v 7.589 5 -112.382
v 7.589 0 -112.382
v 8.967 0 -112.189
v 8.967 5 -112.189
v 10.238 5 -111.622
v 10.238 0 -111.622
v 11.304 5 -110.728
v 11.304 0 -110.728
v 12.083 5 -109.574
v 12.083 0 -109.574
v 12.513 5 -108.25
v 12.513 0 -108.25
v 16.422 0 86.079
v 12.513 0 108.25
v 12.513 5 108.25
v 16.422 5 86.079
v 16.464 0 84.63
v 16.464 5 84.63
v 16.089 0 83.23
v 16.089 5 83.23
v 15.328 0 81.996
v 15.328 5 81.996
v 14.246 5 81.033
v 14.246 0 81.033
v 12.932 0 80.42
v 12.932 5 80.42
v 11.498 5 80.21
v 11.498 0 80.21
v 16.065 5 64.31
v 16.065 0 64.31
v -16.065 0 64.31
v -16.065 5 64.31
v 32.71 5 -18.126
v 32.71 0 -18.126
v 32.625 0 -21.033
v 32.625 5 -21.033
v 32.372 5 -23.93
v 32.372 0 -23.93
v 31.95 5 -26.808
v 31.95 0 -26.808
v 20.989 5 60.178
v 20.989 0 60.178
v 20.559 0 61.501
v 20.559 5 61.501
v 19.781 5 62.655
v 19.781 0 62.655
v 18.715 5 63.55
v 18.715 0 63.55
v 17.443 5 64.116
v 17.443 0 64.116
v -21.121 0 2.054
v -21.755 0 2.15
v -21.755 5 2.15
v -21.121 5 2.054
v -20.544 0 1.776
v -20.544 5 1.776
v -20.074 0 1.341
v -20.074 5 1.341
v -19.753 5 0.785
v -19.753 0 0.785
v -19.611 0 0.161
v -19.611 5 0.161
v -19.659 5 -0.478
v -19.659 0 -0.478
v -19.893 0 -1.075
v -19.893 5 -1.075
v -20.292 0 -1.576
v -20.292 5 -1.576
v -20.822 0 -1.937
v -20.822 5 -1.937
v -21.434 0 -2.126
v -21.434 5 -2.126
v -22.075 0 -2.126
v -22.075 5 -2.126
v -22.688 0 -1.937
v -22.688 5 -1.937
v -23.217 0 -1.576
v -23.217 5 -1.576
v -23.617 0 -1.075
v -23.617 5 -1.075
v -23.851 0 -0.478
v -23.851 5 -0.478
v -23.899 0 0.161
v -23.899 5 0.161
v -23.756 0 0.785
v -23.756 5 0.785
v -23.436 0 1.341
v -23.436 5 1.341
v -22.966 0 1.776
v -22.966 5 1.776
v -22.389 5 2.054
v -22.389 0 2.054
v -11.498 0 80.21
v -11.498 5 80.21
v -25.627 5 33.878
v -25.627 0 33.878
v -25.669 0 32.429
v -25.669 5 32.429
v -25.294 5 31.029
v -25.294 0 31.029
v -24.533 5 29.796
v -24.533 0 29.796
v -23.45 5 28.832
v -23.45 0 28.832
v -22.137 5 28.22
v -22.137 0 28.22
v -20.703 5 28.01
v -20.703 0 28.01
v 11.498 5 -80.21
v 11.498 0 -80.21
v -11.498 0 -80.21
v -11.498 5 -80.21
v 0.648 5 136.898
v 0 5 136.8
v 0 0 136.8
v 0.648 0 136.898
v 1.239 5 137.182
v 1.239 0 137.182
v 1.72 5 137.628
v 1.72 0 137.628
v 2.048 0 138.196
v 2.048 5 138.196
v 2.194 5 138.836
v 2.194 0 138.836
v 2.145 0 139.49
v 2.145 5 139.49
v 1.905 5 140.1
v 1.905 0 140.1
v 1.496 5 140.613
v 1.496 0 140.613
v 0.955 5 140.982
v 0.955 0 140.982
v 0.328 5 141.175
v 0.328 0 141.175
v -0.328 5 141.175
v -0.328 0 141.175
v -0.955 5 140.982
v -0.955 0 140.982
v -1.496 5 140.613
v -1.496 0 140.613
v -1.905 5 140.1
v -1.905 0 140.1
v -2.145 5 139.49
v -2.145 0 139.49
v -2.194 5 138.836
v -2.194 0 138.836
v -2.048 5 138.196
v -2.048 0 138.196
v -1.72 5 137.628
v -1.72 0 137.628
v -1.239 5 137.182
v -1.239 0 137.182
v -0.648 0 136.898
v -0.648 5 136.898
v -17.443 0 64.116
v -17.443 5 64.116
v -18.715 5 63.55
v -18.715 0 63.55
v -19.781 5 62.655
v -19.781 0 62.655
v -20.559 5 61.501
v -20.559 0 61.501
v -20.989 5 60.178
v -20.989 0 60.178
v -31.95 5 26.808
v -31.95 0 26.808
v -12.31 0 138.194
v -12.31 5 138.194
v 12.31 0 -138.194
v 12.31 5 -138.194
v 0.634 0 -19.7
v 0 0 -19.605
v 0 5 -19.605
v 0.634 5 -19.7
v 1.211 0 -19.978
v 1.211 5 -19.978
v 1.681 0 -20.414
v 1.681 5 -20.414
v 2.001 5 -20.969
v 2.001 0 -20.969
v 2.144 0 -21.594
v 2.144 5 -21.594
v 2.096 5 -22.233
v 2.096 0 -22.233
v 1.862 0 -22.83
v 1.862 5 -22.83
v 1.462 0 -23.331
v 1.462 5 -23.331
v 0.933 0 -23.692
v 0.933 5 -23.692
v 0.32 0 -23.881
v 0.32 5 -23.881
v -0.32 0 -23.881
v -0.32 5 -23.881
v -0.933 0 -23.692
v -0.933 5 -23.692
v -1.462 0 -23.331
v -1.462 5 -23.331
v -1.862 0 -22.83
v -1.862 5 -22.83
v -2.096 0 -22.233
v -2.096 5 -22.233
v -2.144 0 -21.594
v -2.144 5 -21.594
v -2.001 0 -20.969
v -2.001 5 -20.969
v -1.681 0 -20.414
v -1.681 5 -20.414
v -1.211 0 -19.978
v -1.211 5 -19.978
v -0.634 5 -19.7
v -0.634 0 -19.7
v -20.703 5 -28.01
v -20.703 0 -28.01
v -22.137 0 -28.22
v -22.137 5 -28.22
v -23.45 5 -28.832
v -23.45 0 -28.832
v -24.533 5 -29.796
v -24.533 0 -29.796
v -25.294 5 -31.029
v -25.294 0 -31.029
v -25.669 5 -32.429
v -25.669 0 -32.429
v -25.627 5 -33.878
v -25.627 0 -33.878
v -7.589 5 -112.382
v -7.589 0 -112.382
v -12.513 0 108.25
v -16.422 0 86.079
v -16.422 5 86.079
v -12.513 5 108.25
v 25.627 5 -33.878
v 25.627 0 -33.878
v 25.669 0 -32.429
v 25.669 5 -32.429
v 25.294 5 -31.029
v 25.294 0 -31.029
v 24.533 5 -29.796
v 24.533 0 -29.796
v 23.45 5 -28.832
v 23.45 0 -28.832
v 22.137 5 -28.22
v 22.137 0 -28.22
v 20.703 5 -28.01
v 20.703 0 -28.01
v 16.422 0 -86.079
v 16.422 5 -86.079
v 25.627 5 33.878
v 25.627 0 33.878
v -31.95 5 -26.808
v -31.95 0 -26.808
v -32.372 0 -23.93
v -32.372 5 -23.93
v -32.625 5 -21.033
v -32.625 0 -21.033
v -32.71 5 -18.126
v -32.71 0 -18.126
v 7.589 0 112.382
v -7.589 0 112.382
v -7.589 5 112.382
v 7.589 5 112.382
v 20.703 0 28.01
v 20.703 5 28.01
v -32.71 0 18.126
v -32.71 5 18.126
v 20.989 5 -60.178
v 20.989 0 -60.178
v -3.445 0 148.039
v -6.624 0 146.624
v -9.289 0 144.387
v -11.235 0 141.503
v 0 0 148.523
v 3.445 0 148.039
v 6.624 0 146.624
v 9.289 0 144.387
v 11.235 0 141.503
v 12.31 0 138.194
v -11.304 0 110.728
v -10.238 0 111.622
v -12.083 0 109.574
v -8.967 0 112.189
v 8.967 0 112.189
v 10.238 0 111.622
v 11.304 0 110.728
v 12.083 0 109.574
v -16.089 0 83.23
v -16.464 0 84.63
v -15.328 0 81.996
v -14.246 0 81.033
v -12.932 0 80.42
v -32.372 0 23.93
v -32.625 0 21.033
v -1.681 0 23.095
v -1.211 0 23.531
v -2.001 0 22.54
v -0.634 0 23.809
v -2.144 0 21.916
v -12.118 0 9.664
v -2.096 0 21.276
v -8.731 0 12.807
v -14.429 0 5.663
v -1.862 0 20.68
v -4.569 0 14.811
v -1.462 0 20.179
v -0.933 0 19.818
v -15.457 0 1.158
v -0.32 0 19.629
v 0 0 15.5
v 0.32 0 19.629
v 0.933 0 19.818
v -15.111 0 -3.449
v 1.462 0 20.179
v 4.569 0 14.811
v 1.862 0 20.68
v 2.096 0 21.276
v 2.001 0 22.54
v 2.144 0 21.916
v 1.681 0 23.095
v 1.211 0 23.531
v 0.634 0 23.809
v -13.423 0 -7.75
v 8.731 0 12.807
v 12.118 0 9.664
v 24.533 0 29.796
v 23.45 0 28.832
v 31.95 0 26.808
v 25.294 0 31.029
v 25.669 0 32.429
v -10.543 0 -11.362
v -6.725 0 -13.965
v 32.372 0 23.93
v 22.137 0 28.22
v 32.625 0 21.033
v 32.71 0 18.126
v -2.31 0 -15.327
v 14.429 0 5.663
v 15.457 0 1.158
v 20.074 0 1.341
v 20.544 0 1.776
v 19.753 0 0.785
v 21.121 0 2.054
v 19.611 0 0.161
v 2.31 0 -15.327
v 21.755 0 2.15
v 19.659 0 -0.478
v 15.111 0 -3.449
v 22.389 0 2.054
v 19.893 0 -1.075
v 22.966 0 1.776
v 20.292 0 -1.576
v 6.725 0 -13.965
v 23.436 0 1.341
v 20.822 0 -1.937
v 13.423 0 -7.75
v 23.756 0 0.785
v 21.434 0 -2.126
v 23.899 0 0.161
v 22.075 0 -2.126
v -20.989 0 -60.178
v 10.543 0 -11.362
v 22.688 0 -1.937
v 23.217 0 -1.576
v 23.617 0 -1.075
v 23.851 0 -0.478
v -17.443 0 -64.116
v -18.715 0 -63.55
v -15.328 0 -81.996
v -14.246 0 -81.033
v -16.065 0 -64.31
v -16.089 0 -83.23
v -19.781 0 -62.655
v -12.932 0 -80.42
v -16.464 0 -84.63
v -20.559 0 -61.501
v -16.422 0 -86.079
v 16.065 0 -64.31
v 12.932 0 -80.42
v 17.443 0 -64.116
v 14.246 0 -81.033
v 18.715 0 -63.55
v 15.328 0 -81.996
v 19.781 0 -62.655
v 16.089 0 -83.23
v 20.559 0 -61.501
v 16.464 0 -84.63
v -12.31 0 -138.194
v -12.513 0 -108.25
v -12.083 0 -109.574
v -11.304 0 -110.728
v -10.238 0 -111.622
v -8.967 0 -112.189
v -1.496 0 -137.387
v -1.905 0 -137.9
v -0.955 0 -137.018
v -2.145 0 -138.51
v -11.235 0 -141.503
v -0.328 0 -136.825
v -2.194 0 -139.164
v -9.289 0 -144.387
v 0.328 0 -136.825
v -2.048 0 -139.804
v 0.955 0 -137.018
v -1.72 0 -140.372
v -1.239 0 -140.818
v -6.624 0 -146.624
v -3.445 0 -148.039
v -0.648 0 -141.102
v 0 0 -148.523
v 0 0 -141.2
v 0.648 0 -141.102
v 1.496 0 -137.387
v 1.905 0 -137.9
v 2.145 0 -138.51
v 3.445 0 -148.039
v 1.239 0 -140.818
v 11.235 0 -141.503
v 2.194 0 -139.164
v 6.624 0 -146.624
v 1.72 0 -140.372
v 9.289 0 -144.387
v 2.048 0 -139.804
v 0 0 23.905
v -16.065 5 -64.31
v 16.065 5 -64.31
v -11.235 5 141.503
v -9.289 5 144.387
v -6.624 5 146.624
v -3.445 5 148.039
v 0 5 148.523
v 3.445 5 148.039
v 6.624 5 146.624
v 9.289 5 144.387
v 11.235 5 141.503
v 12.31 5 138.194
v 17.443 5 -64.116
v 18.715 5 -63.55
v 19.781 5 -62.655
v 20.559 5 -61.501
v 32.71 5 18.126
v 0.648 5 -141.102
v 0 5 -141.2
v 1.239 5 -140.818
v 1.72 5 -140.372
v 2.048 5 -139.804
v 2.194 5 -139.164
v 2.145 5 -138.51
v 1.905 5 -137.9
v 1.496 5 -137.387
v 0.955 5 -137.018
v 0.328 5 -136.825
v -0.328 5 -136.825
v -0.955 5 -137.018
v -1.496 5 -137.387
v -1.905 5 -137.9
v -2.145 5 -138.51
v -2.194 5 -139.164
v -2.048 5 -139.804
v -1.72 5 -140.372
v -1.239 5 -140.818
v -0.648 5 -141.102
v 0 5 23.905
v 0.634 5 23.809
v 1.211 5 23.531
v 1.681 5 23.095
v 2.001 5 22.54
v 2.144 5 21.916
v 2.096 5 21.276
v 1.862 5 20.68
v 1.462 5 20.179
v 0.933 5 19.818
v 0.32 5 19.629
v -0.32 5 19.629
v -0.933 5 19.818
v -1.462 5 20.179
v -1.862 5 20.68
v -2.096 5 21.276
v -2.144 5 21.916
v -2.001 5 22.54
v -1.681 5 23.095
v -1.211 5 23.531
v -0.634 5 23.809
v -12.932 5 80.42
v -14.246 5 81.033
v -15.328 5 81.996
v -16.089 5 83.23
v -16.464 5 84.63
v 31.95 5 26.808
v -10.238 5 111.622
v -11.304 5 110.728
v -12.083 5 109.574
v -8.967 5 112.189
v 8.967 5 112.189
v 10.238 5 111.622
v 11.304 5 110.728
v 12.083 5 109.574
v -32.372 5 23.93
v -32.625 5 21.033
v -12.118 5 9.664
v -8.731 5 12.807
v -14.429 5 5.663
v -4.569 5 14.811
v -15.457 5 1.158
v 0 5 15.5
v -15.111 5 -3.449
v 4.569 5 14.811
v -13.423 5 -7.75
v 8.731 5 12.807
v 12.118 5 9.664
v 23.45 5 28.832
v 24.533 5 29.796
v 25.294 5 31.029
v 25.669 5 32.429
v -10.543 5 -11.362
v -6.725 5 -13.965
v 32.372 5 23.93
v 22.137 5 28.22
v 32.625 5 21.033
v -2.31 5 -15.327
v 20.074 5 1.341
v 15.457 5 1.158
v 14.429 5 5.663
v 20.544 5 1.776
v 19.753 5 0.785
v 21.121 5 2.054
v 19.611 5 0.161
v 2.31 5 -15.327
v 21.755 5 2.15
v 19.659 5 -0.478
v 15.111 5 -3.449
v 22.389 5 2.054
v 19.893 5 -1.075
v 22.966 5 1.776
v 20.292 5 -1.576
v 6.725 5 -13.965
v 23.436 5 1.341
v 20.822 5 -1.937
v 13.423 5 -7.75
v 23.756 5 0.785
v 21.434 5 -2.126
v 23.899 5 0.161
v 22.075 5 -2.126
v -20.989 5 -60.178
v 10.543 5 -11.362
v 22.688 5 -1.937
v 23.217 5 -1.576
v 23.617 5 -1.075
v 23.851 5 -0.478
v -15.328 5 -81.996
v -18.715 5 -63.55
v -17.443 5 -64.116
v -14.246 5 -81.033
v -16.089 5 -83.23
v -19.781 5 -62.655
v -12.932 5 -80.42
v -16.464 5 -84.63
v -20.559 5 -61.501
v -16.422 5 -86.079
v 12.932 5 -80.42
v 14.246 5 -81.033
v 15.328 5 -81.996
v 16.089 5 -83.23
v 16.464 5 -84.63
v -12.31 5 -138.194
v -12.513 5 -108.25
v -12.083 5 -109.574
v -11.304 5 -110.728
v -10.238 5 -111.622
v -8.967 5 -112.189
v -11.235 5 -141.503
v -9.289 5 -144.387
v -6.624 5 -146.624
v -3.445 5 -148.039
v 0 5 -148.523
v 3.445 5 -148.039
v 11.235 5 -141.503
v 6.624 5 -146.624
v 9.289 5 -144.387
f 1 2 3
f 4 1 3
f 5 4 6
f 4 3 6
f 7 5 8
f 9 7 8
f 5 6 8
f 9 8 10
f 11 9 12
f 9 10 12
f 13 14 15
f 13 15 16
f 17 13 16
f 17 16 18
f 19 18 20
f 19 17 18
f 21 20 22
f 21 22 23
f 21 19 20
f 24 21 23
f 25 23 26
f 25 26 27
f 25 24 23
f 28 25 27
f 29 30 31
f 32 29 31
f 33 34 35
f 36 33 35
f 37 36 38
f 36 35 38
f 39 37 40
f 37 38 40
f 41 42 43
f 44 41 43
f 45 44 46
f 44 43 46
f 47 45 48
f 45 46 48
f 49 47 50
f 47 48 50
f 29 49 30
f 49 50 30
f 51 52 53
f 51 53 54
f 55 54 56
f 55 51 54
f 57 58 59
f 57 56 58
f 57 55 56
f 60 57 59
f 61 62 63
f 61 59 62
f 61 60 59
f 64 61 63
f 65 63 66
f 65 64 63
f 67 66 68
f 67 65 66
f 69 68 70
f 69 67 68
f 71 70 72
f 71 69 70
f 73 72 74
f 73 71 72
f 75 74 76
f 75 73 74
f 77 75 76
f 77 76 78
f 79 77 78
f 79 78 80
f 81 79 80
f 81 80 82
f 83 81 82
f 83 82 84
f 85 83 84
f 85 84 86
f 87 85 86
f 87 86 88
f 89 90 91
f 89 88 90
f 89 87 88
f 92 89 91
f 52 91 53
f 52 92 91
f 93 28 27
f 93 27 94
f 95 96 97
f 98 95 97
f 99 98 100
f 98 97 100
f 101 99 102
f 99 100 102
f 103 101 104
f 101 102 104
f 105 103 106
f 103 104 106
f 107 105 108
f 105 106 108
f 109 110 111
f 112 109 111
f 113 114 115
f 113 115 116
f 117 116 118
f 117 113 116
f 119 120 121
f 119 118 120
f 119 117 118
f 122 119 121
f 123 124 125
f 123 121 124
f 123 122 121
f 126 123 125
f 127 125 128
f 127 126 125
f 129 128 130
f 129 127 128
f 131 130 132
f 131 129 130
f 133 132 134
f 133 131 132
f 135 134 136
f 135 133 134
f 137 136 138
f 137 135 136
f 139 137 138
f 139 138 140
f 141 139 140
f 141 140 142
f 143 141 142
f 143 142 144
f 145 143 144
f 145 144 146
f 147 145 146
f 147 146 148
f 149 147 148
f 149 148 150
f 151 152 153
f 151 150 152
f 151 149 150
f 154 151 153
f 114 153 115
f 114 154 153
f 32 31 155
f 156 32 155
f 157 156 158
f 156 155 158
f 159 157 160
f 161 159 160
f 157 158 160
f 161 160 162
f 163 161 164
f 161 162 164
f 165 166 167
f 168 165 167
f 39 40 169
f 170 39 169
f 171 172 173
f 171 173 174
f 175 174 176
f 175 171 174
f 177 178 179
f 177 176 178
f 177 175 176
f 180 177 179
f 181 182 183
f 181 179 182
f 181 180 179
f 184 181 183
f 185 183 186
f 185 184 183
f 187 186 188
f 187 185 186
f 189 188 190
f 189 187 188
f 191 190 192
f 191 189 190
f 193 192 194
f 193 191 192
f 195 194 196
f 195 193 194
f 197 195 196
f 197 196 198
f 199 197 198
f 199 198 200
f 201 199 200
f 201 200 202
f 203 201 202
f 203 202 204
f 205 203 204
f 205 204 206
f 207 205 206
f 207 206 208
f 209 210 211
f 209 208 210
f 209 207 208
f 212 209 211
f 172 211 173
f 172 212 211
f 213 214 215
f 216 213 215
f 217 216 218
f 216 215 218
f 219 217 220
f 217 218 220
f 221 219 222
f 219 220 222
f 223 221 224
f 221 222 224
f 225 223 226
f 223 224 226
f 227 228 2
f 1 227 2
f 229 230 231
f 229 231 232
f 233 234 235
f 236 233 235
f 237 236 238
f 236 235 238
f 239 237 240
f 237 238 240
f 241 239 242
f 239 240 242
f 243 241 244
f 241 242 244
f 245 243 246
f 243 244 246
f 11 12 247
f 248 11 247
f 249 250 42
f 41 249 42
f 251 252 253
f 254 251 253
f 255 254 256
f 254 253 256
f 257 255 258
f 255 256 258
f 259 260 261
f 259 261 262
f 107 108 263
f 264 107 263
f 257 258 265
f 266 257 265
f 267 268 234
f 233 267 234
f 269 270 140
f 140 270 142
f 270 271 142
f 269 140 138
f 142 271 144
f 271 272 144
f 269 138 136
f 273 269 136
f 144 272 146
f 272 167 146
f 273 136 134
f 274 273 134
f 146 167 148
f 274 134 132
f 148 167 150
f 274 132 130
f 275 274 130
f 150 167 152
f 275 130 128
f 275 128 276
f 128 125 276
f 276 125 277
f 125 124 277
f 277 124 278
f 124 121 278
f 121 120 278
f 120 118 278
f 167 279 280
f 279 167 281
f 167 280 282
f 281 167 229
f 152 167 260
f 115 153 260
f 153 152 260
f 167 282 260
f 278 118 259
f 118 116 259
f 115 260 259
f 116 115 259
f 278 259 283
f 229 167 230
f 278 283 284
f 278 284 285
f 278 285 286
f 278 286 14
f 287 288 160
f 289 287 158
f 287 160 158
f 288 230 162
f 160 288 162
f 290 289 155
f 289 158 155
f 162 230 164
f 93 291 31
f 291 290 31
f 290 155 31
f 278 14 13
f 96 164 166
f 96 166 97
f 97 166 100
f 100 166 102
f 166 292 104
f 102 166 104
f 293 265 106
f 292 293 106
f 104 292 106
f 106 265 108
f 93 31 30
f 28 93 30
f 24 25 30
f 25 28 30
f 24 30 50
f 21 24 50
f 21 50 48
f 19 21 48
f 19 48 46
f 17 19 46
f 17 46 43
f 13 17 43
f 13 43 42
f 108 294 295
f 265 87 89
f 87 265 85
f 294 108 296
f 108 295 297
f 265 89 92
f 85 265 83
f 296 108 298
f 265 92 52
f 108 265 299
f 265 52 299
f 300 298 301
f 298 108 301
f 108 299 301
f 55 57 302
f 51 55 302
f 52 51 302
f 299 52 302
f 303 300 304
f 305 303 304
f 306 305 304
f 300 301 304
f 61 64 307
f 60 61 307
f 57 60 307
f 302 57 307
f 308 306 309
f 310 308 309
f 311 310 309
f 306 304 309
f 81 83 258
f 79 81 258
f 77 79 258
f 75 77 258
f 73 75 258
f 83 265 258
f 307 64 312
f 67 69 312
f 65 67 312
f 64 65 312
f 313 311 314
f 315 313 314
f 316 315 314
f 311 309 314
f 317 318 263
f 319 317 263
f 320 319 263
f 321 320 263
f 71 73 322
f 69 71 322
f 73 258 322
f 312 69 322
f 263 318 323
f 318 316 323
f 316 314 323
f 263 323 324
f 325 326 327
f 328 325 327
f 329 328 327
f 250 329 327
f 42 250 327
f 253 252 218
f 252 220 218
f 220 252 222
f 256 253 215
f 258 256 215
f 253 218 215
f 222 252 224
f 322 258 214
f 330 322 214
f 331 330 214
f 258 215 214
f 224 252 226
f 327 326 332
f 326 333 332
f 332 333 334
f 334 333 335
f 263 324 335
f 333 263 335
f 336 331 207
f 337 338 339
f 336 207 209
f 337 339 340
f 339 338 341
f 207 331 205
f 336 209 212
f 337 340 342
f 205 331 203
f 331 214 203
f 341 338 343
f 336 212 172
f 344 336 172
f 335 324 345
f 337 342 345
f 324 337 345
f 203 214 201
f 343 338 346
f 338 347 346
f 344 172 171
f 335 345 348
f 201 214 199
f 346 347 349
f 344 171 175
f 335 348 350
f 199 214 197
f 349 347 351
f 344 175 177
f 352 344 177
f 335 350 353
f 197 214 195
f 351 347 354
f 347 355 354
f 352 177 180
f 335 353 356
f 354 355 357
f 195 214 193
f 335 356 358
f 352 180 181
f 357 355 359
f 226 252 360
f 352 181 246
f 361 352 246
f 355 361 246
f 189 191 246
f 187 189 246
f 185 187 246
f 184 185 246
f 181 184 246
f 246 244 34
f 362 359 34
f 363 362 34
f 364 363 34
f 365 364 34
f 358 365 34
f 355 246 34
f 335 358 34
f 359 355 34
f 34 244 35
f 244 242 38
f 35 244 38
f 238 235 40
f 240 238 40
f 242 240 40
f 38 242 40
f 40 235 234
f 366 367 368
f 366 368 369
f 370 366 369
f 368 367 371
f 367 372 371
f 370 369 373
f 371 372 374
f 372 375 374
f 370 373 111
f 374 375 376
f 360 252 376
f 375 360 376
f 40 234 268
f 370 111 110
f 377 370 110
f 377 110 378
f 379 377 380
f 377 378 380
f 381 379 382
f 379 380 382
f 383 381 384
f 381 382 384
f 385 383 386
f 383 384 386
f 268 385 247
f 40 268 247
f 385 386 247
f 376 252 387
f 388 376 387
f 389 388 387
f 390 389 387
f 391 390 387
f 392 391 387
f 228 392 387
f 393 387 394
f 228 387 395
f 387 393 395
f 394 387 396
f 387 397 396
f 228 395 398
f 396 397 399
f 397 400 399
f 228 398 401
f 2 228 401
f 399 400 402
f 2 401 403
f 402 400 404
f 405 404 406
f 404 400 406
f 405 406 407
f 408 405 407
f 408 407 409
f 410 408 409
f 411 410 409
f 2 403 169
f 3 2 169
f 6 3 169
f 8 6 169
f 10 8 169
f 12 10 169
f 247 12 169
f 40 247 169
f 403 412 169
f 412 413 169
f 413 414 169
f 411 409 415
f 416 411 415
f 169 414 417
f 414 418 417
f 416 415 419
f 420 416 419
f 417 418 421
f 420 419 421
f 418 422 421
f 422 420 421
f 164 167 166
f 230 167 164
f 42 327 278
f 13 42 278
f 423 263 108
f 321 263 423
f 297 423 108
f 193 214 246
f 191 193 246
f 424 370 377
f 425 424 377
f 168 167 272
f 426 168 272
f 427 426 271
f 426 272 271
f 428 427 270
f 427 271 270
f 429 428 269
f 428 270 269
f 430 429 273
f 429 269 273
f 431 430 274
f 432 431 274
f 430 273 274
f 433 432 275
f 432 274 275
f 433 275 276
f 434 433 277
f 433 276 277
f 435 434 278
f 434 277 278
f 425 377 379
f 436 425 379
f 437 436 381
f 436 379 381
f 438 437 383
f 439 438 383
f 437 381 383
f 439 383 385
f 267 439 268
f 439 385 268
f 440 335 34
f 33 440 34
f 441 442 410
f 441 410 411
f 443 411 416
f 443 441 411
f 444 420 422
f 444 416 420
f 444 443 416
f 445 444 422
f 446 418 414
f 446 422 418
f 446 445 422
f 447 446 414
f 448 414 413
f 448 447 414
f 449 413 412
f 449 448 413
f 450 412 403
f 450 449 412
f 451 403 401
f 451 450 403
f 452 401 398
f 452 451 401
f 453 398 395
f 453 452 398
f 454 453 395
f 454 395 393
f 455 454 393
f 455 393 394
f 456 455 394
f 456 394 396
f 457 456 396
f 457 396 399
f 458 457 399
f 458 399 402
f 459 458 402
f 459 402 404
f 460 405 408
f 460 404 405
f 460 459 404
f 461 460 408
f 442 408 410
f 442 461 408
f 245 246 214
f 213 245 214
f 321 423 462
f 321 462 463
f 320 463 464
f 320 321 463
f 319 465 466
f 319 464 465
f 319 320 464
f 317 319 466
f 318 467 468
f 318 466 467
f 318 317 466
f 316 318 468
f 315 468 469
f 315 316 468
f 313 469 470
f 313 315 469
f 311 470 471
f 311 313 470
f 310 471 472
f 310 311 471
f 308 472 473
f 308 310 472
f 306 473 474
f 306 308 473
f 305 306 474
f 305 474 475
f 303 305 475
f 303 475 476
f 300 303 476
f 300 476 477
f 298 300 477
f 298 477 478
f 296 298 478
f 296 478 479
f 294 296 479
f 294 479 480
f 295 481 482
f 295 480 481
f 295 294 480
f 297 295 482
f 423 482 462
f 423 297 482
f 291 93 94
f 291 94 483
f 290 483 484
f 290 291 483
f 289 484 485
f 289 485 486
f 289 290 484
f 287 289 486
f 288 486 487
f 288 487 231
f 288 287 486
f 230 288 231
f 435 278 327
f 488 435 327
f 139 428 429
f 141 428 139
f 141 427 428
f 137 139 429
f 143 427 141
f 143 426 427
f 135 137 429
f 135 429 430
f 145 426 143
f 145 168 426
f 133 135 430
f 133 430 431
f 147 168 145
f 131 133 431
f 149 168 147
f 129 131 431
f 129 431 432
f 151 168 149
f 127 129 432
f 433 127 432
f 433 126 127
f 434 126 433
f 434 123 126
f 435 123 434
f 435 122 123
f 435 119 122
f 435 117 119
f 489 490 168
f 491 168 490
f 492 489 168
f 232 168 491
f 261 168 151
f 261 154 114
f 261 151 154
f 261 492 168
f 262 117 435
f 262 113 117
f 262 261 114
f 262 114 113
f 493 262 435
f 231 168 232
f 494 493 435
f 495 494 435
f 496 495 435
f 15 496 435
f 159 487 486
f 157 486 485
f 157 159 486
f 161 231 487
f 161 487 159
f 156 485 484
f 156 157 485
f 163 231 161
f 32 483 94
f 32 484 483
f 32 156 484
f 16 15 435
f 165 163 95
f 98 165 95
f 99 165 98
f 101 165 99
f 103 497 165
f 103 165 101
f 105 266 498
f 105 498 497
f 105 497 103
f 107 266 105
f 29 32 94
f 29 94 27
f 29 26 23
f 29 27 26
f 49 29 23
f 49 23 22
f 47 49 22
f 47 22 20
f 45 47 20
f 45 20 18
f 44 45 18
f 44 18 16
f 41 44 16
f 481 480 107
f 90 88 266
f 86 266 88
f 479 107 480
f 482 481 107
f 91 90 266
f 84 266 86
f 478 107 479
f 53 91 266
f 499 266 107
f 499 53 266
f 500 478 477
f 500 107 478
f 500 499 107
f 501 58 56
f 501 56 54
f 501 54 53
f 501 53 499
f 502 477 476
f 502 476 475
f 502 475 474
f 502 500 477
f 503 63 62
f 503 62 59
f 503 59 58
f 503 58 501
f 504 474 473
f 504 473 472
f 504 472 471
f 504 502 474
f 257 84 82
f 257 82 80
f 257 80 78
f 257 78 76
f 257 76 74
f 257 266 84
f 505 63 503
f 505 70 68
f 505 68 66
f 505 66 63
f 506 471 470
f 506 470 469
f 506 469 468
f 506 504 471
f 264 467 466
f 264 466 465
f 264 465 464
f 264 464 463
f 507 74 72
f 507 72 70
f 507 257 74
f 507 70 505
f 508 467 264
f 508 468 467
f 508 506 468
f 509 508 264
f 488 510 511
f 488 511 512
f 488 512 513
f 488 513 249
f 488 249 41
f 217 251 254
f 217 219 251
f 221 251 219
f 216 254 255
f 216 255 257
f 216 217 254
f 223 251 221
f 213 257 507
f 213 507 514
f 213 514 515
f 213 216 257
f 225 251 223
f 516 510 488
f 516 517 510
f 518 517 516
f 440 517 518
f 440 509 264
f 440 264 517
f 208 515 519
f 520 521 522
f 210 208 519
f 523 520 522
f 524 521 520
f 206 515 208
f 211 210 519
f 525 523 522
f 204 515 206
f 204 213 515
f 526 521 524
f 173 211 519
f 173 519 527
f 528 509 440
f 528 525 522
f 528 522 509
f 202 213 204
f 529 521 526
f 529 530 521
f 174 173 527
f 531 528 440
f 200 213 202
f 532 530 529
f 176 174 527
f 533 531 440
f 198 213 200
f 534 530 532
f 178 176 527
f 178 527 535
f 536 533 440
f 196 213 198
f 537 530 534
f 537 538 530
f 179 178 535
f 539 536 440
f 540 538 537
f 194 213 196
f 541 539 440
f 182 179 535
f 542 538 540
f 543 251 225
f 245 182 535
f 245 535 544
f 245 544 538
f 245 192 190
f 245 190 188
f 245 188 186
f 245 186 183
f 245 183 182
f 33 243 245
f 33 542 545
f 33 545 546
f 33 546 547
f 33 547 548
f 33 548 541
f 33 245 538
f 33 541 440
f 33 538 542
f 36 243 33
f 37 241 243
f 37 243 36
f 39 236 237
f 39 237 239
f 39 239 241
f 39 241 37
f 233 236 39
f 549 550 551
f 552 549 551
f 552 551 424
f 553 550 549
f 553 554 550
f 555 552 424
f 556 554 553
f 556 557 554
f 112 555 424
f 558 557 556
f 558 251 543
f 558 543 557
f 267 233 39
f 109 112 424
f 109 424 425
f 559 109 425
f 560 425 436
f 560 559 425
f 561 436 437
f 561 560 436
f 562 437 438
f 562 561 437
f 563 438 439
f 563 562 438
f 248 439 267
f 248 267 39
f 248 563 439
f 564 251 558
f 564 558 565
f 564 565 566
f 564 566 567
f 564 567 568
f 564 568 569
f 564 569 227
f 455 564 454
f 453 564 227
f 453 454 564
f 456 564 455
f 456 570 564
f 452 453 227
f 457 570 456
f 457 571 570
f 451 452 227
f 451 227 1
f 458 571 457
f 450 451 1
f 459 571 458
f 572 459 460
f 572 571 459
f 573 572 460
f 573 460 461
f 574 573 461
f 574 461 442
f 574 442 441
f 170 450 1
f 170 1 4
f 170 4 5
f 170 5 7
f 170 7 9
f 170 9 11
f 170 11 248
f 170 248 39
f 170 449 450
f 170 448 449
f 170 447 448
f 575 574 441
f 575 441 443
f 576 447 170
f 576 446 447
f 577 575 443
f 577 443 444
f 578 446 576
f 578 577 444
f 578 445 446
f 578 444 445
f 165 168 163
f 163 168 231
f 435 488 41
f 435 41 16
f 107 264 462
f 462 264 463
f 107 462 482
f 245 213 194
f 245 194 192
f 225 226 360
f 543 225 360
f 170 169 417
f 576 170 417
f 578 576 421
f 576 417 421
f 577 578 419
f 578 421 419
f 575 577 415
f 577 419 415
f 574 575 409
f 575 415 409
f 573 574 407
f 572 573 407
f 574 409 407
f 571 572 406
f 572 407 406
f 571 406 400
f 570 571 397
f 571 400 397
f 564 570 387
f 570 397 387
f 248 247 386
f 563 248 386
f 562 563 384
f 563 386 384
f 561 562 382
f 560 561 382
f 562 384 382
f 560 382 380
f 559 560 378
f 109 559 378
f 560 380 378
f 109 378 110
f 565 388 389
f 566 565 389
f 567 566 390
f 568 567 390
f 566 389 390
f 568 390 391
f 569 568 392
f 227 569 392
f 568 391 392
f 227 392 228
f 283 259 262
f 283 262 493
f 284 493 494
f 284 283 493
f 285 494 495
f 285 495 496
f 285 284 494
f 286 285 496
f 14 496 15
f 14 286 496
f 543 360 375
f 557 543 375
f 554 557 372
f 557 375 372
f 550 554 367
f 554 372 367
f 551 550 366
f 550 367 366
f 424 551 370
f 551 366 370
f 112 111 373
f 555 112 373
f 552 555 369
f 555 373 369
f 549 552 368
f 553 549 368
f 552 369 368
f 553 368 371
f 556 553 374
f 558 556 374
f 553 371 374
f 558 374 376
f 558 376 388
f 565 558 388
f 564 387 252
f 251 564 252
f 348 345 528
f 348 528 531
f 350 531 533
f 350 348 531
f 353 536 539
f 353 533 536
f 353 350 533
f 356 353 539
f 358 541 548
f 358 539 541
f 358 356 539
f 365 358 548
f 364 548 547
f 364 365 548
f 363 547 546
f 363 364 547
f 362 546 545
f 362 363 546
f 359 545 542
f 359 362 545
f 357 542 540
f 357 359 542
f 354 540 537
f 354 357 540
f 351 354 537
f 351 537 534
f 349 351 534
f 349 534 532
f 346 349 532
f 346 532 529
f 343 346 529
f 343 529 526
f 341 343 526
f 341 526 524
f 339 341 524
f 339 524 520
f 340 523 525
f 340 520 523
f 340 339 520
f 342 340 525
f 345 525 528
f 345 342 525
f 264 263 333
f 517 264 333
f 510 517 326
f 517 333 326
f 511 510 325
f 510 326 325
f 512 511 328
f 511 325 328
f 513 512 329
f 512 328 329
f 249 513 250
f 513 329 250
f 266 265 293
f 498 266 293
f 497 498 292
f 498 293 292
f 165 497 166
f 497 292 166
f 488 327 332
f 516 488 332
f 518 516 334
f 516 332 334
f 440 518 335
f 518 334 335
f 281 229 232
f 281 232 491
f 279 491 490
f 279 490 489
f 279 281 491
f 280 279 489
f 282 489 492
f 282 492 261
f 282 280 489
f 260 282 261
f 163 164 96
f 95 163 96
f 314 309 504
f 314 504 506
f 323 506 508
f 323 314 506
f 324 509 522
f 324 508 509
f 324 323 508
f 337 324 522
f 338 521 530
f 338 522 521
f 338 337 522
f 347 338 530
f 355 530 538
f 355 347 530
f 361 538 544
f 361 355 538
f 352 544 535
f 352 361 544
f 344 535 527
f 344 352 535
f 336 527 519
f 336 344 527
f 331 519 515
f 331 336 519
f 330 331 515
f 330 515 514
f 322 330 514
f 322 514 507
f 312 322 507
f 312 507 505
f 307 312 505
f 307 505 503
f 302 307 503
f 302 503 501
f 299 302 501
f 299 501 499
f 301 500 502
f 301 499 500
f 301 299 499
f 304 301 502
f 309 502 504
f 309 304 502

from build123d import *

# Parameters (mm, degrees)
BOSS_EXTRUDE1_DEPTH     = 5
CUT_EXTRUDE1_DEPTH      = 153.164632892
CUT_EXTRUDE1_DEPTH_BACK = 153.164632892
SKETCH2_R               = 15.5
SKETCH2_R_2             = 2.15
CUT_EXTRUDE2_DEPTH      = 153.164632892
CUT_EXTRUDE2_DEPTH_BACK = 153.164632892
SKETCH3_R               = 2.2


with BuildPart() as part:
    # Sketch1 → Boss-Extrude1 (new body)
    with BuildSketch(Plane(origin=(0, 0, 0), x_dir=(1, 0, 0), z_dir=(0, 1, 0))):
        with BuildLine():
            Line((-12.310096913, 138.193763743), (-31.950416611, 26.807975707))
            ThreePointArc((-31.950416611, 26.807975707), (-32.519763865, 22.483353961), (-32.71002896, 18.125566824))
            Line((-32.71002896, 18.125566824), (-32.71002896, -18.125566824))
            ThreePointArc((-32.71002896, -18.125566824), (-32.519763865, -22.483353961), (-31.950416611, -26.807975707))
            Line((-31.950416611, -26.807975707), (-12.310096913, -138.193763743))
            ThreePointArc((-12.310096913, -138.193763743), (0, -148.523161522), (12.310096913, -138.193763743))
            Line((12.310096913, -138.193763743), (31.950416611, -26.807975707))
            ThreePointArc((31.950416611, -26.807975707), (32.519763865, -22.483353961), (32.71002896, -18.125566824))
            Line((32.71002896, -18.125566824), (32.71002896, 18.125566824))
            ThreePointArc((32.71002896, 18.125566824), (32.519763865, 22.483353961), (31.950416611, 26.807975707))
            Line((31.950416611, 26.807975707), (12.310096913, 138.193763743))
            ThreePointArc((12.310096913, 138.193763743), (0, 148.523161522), (-12.310096913, 138.193763743))
        make_face()
        with BuildLine():
            Line((12.512772117, 108.250483124), (16.422284735, 86.078535291))
            ThreePointArc((16.422284735, 86.078535291), (15.328468186, 81.996356354), (11.49824597, 80.210294402))
            Line((11.49824597, 80.210294402), (-11.49824597, 80.210294402))
            ThreePointArc((-11.49824597, 80.210294402), (-15.328468186, 81.996356354), (-16.422284735, 86.078535291))
            Line((-16.422284735, 86.078535291), (-12.512772117, 108.250483124))
            ThreePointArc((-12.512772117, 108.250483124), (-10.802671401, 111.212464452), (-7.588733352, 112.382242236))
            Line((-7.588733352, 112.382242236), (7.588733352, 112.382242236))
            ThreePointArc((7.588733352, 112.382242236), (10.802671401, 111.212464452), (12.512772117, 108.250483124))
        make_face(mode=Mode.SUBTRACT)
        with BuildLine():
            Line((-16.065250357, 64.309525453), (16.065250357, 64.309525453))
            ThreePointArc((16.065250357, 64.309525453), (19.279188405, 63.139747668), (20.989289122, 60.177766341))
            Line((20.989289122, 60.177766341), (25.626657813, 33.877941591))
            ThreePointArc((25.626657813, 33.877941591), (24.532841264, 29.795762655), (20.702619048, 28.009700703))
            Line((20.702619048, 28.009700703), (-20.702619048, 28.009700703))
            ThreePointArc((-20.702619048, 28.009700703), (-24.532841264, 29.795762655), (-25.626657813, 33.877941591))
            Line((-25.626657813, 33.877941591), (-20.989289122, 60.177766341))
            ThreePointArc((-20.989289122, 60.177766341), (-19.279188405, 63.139747668), (-16.065250357, 64.309525453))
        make_face(mode=Mode.SUBTRACT)
        with BuildLine():
            Line((-7.588733352, -112.382242236), (7.588733352, -112.382242236))
            ThreePointArc((7.588733352, -112.382242236), (10.802671401, -111.212464452), (12.512772117, -108.250483124))
            Line((12.512772117, -108.250483124), (16.422284735, -86.078535291))
            ThreePointArc((16.422284735, -86.078535291), (15.328468186, -81.996356354), (11.49824597, -80.210294402))
            Line((11.49824597, -80.210294402), (-11.49824597, -80.210294402))
            ThreePointArc((-11.49824597, -80.210294402), (-15.328468186, -81.996356354), (-16.422284735, -86.078535291))
            Line((-16.422284735, -86.078535291), (-12.512772117, -108.250483124))
            ThreePointArc((-12.512772117, -108.250483124), (-10.802671401, -111.212464452), (-7.588733352, -112.382242236))
        make_face(mode=Mode.SUBTRACT)
        with BuildLine():
            Line((-20.989289122, -60.177766341), (-25.626657813, -33.877941591))
            ThreePointArc((-25.626657813, -33.877941591), (-24.532841264, -29.795762655), (-20.702619048, -28.009700703))
            Line((-20.702619048, -28.009700703), (20.702619048, -28.009700703))
            ThreePointArc((20.702619048, -28.009700703), (24.532841264, -29.795762655), (25.626657813, -33.877941591))
            Line((25.626657813, -33.877941591), (20.989289122, -60.177766341))
            ThreePointArc((20.989289122, -60.177766341), (19.279188405, -63.139747668), (16.065250357, -64.309525453))
            Line((16.065250357, -64.309525453), (-16.065250357, -64.309525453))
            ThreePointArc((-16.065250357, -64.309525453), (-19.279188405, -63.139747668), (-20.989289122, -60.177766341))
        make_face(mode=Mode.SUBTRACT)
    extrude(amount=BOSS_EXTRUDE1_DEPTH)

    # Sketch2 → Cut-Extrude1 (cut, two sides: drawn at the far end of the back side and taken through both)
    with BuildSketch(Plane(origin=(0, 5, 0), x_dir=(1, 0, 0), z_dir=(0, 1, 0)).offset(-CUT_EXTRUDE1_DEPTH_BACK)):
        with Locations(Location((0, 0, 0), (0, 0, 270))):
            Circle(SKETCH2_R)
        with Locations(Location((0, 21.754850352, 0), (0, 0, 270))):
            Circle(SKETCH2_R_2)
        with Locations(Location((21.754850352, 0, 0), (0, 0, 270))):
            Circle(SKETCH2_R_2)
        with Locations(Location((0, -21.754850352, 0), (0, 0, 270))):
            Circle(SKETCH2_R_2)
        with Locations(Location((-21.754850352, 0, 0), (0, 0, 270))):
            Circle(SKETCH2_R_2)
    extrude(amount=CUT_EXTRUDE1_DEPTH + CUT_EXTRUDE1_DEPTH_BACK, mode=Mode.SUBTRACT)

    # Sketch3 → Cut-Extrude2 (cut, two sides: drawn at the far end of the back side and taken through both)
    with BuildSketch(Plane.XZ.offset(-CUT_EXTRUDE2_DEPTH_BACK)):
        with Locations(Location((0, -139, 0), (0, 0, 270))):
            Circle(SKETCH3_R)
        with Locations(Location((0, 139, 0), (0, 0, 270))):
            Circle(SKETCH3_R)
    extrude(amount=CUT_EXTRUDE2_DEPTH + CUT_EXTRUDE2_DEPTH_BACK, mode=Mode.SUBTRACT)


solid = part.part
